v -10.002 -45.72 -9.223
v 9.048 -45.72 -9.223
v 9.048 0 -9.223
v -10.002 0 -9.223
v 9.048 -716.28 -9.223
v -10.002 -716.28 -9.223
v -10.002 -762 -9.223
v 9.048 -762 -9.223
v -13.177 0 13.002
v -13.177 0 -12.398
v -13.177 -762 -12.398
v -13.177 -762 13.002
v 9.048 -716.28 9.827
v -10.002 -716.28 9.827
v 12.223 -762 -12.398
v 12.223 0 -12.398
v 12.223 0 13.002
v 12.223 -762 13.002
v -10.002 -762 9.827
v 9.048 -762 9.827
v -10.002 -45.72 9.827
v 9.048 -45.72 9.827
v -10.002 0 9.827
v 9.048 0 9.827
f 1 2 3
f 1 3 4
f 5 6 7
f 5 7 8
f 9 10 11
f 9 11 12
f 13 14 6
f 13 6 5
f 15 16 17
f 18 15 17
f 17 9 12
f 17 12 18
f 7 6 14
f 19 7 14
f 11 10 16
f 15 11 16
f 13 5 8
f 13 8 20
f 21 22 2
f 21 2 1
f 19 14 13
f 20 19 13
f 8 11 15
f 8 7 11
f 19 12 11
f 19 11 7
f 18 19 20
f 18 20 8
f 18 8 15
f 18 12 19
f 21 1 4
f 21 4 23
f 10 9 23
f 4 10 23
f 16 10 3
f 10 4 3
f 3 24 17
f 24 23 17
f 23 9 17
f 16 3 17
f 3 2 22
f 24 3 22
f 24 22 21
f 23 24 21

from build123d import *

# Parameters (mm, degrees)
F0_W     = 25.4
F0_H     = 25.4
F1_DEPTH = 762
F2_W     = 19.05
F2_H     = 19.05
F3_DEPTH = 45.72
F4_W     = 19.05
F4_H     = 19.05
F5_DEPTH = 45.72


with BuildPart() as f1:
    # F0 (on Front) → F1 (new body)
    with BuildSketch(Plane.XZ):
        with Locations((-0.477387, 0.30238)):
            Rectangle(F0_W, F0_H)
    extrude(amount=F1_DEPTH)

    # F2 (on face) → F3 (cut)
    with BuildSketch(Plane.XZ.offset(762)):
        with Locations((-0.477387, 0.30238)):
            Rectangle(F2_W, F2_H)
    extrude(amount=-F3_DEPTH, mode=Mode.SUBTRACT)

    # F4 (on face) → F5 (cut)
    with BuildSketch(Plane(origin=(0, 0, 0), x_dir=(-1, 0, 0), z_dir=(0, 1, 0))):
        with Locations((0.477387, 0.30238)):
            Rectangle(F4_W, F4_H)
    extrude(amount=-F5_DEPTH, mode=Mode.SUBTRACT)


solid = f1.part
